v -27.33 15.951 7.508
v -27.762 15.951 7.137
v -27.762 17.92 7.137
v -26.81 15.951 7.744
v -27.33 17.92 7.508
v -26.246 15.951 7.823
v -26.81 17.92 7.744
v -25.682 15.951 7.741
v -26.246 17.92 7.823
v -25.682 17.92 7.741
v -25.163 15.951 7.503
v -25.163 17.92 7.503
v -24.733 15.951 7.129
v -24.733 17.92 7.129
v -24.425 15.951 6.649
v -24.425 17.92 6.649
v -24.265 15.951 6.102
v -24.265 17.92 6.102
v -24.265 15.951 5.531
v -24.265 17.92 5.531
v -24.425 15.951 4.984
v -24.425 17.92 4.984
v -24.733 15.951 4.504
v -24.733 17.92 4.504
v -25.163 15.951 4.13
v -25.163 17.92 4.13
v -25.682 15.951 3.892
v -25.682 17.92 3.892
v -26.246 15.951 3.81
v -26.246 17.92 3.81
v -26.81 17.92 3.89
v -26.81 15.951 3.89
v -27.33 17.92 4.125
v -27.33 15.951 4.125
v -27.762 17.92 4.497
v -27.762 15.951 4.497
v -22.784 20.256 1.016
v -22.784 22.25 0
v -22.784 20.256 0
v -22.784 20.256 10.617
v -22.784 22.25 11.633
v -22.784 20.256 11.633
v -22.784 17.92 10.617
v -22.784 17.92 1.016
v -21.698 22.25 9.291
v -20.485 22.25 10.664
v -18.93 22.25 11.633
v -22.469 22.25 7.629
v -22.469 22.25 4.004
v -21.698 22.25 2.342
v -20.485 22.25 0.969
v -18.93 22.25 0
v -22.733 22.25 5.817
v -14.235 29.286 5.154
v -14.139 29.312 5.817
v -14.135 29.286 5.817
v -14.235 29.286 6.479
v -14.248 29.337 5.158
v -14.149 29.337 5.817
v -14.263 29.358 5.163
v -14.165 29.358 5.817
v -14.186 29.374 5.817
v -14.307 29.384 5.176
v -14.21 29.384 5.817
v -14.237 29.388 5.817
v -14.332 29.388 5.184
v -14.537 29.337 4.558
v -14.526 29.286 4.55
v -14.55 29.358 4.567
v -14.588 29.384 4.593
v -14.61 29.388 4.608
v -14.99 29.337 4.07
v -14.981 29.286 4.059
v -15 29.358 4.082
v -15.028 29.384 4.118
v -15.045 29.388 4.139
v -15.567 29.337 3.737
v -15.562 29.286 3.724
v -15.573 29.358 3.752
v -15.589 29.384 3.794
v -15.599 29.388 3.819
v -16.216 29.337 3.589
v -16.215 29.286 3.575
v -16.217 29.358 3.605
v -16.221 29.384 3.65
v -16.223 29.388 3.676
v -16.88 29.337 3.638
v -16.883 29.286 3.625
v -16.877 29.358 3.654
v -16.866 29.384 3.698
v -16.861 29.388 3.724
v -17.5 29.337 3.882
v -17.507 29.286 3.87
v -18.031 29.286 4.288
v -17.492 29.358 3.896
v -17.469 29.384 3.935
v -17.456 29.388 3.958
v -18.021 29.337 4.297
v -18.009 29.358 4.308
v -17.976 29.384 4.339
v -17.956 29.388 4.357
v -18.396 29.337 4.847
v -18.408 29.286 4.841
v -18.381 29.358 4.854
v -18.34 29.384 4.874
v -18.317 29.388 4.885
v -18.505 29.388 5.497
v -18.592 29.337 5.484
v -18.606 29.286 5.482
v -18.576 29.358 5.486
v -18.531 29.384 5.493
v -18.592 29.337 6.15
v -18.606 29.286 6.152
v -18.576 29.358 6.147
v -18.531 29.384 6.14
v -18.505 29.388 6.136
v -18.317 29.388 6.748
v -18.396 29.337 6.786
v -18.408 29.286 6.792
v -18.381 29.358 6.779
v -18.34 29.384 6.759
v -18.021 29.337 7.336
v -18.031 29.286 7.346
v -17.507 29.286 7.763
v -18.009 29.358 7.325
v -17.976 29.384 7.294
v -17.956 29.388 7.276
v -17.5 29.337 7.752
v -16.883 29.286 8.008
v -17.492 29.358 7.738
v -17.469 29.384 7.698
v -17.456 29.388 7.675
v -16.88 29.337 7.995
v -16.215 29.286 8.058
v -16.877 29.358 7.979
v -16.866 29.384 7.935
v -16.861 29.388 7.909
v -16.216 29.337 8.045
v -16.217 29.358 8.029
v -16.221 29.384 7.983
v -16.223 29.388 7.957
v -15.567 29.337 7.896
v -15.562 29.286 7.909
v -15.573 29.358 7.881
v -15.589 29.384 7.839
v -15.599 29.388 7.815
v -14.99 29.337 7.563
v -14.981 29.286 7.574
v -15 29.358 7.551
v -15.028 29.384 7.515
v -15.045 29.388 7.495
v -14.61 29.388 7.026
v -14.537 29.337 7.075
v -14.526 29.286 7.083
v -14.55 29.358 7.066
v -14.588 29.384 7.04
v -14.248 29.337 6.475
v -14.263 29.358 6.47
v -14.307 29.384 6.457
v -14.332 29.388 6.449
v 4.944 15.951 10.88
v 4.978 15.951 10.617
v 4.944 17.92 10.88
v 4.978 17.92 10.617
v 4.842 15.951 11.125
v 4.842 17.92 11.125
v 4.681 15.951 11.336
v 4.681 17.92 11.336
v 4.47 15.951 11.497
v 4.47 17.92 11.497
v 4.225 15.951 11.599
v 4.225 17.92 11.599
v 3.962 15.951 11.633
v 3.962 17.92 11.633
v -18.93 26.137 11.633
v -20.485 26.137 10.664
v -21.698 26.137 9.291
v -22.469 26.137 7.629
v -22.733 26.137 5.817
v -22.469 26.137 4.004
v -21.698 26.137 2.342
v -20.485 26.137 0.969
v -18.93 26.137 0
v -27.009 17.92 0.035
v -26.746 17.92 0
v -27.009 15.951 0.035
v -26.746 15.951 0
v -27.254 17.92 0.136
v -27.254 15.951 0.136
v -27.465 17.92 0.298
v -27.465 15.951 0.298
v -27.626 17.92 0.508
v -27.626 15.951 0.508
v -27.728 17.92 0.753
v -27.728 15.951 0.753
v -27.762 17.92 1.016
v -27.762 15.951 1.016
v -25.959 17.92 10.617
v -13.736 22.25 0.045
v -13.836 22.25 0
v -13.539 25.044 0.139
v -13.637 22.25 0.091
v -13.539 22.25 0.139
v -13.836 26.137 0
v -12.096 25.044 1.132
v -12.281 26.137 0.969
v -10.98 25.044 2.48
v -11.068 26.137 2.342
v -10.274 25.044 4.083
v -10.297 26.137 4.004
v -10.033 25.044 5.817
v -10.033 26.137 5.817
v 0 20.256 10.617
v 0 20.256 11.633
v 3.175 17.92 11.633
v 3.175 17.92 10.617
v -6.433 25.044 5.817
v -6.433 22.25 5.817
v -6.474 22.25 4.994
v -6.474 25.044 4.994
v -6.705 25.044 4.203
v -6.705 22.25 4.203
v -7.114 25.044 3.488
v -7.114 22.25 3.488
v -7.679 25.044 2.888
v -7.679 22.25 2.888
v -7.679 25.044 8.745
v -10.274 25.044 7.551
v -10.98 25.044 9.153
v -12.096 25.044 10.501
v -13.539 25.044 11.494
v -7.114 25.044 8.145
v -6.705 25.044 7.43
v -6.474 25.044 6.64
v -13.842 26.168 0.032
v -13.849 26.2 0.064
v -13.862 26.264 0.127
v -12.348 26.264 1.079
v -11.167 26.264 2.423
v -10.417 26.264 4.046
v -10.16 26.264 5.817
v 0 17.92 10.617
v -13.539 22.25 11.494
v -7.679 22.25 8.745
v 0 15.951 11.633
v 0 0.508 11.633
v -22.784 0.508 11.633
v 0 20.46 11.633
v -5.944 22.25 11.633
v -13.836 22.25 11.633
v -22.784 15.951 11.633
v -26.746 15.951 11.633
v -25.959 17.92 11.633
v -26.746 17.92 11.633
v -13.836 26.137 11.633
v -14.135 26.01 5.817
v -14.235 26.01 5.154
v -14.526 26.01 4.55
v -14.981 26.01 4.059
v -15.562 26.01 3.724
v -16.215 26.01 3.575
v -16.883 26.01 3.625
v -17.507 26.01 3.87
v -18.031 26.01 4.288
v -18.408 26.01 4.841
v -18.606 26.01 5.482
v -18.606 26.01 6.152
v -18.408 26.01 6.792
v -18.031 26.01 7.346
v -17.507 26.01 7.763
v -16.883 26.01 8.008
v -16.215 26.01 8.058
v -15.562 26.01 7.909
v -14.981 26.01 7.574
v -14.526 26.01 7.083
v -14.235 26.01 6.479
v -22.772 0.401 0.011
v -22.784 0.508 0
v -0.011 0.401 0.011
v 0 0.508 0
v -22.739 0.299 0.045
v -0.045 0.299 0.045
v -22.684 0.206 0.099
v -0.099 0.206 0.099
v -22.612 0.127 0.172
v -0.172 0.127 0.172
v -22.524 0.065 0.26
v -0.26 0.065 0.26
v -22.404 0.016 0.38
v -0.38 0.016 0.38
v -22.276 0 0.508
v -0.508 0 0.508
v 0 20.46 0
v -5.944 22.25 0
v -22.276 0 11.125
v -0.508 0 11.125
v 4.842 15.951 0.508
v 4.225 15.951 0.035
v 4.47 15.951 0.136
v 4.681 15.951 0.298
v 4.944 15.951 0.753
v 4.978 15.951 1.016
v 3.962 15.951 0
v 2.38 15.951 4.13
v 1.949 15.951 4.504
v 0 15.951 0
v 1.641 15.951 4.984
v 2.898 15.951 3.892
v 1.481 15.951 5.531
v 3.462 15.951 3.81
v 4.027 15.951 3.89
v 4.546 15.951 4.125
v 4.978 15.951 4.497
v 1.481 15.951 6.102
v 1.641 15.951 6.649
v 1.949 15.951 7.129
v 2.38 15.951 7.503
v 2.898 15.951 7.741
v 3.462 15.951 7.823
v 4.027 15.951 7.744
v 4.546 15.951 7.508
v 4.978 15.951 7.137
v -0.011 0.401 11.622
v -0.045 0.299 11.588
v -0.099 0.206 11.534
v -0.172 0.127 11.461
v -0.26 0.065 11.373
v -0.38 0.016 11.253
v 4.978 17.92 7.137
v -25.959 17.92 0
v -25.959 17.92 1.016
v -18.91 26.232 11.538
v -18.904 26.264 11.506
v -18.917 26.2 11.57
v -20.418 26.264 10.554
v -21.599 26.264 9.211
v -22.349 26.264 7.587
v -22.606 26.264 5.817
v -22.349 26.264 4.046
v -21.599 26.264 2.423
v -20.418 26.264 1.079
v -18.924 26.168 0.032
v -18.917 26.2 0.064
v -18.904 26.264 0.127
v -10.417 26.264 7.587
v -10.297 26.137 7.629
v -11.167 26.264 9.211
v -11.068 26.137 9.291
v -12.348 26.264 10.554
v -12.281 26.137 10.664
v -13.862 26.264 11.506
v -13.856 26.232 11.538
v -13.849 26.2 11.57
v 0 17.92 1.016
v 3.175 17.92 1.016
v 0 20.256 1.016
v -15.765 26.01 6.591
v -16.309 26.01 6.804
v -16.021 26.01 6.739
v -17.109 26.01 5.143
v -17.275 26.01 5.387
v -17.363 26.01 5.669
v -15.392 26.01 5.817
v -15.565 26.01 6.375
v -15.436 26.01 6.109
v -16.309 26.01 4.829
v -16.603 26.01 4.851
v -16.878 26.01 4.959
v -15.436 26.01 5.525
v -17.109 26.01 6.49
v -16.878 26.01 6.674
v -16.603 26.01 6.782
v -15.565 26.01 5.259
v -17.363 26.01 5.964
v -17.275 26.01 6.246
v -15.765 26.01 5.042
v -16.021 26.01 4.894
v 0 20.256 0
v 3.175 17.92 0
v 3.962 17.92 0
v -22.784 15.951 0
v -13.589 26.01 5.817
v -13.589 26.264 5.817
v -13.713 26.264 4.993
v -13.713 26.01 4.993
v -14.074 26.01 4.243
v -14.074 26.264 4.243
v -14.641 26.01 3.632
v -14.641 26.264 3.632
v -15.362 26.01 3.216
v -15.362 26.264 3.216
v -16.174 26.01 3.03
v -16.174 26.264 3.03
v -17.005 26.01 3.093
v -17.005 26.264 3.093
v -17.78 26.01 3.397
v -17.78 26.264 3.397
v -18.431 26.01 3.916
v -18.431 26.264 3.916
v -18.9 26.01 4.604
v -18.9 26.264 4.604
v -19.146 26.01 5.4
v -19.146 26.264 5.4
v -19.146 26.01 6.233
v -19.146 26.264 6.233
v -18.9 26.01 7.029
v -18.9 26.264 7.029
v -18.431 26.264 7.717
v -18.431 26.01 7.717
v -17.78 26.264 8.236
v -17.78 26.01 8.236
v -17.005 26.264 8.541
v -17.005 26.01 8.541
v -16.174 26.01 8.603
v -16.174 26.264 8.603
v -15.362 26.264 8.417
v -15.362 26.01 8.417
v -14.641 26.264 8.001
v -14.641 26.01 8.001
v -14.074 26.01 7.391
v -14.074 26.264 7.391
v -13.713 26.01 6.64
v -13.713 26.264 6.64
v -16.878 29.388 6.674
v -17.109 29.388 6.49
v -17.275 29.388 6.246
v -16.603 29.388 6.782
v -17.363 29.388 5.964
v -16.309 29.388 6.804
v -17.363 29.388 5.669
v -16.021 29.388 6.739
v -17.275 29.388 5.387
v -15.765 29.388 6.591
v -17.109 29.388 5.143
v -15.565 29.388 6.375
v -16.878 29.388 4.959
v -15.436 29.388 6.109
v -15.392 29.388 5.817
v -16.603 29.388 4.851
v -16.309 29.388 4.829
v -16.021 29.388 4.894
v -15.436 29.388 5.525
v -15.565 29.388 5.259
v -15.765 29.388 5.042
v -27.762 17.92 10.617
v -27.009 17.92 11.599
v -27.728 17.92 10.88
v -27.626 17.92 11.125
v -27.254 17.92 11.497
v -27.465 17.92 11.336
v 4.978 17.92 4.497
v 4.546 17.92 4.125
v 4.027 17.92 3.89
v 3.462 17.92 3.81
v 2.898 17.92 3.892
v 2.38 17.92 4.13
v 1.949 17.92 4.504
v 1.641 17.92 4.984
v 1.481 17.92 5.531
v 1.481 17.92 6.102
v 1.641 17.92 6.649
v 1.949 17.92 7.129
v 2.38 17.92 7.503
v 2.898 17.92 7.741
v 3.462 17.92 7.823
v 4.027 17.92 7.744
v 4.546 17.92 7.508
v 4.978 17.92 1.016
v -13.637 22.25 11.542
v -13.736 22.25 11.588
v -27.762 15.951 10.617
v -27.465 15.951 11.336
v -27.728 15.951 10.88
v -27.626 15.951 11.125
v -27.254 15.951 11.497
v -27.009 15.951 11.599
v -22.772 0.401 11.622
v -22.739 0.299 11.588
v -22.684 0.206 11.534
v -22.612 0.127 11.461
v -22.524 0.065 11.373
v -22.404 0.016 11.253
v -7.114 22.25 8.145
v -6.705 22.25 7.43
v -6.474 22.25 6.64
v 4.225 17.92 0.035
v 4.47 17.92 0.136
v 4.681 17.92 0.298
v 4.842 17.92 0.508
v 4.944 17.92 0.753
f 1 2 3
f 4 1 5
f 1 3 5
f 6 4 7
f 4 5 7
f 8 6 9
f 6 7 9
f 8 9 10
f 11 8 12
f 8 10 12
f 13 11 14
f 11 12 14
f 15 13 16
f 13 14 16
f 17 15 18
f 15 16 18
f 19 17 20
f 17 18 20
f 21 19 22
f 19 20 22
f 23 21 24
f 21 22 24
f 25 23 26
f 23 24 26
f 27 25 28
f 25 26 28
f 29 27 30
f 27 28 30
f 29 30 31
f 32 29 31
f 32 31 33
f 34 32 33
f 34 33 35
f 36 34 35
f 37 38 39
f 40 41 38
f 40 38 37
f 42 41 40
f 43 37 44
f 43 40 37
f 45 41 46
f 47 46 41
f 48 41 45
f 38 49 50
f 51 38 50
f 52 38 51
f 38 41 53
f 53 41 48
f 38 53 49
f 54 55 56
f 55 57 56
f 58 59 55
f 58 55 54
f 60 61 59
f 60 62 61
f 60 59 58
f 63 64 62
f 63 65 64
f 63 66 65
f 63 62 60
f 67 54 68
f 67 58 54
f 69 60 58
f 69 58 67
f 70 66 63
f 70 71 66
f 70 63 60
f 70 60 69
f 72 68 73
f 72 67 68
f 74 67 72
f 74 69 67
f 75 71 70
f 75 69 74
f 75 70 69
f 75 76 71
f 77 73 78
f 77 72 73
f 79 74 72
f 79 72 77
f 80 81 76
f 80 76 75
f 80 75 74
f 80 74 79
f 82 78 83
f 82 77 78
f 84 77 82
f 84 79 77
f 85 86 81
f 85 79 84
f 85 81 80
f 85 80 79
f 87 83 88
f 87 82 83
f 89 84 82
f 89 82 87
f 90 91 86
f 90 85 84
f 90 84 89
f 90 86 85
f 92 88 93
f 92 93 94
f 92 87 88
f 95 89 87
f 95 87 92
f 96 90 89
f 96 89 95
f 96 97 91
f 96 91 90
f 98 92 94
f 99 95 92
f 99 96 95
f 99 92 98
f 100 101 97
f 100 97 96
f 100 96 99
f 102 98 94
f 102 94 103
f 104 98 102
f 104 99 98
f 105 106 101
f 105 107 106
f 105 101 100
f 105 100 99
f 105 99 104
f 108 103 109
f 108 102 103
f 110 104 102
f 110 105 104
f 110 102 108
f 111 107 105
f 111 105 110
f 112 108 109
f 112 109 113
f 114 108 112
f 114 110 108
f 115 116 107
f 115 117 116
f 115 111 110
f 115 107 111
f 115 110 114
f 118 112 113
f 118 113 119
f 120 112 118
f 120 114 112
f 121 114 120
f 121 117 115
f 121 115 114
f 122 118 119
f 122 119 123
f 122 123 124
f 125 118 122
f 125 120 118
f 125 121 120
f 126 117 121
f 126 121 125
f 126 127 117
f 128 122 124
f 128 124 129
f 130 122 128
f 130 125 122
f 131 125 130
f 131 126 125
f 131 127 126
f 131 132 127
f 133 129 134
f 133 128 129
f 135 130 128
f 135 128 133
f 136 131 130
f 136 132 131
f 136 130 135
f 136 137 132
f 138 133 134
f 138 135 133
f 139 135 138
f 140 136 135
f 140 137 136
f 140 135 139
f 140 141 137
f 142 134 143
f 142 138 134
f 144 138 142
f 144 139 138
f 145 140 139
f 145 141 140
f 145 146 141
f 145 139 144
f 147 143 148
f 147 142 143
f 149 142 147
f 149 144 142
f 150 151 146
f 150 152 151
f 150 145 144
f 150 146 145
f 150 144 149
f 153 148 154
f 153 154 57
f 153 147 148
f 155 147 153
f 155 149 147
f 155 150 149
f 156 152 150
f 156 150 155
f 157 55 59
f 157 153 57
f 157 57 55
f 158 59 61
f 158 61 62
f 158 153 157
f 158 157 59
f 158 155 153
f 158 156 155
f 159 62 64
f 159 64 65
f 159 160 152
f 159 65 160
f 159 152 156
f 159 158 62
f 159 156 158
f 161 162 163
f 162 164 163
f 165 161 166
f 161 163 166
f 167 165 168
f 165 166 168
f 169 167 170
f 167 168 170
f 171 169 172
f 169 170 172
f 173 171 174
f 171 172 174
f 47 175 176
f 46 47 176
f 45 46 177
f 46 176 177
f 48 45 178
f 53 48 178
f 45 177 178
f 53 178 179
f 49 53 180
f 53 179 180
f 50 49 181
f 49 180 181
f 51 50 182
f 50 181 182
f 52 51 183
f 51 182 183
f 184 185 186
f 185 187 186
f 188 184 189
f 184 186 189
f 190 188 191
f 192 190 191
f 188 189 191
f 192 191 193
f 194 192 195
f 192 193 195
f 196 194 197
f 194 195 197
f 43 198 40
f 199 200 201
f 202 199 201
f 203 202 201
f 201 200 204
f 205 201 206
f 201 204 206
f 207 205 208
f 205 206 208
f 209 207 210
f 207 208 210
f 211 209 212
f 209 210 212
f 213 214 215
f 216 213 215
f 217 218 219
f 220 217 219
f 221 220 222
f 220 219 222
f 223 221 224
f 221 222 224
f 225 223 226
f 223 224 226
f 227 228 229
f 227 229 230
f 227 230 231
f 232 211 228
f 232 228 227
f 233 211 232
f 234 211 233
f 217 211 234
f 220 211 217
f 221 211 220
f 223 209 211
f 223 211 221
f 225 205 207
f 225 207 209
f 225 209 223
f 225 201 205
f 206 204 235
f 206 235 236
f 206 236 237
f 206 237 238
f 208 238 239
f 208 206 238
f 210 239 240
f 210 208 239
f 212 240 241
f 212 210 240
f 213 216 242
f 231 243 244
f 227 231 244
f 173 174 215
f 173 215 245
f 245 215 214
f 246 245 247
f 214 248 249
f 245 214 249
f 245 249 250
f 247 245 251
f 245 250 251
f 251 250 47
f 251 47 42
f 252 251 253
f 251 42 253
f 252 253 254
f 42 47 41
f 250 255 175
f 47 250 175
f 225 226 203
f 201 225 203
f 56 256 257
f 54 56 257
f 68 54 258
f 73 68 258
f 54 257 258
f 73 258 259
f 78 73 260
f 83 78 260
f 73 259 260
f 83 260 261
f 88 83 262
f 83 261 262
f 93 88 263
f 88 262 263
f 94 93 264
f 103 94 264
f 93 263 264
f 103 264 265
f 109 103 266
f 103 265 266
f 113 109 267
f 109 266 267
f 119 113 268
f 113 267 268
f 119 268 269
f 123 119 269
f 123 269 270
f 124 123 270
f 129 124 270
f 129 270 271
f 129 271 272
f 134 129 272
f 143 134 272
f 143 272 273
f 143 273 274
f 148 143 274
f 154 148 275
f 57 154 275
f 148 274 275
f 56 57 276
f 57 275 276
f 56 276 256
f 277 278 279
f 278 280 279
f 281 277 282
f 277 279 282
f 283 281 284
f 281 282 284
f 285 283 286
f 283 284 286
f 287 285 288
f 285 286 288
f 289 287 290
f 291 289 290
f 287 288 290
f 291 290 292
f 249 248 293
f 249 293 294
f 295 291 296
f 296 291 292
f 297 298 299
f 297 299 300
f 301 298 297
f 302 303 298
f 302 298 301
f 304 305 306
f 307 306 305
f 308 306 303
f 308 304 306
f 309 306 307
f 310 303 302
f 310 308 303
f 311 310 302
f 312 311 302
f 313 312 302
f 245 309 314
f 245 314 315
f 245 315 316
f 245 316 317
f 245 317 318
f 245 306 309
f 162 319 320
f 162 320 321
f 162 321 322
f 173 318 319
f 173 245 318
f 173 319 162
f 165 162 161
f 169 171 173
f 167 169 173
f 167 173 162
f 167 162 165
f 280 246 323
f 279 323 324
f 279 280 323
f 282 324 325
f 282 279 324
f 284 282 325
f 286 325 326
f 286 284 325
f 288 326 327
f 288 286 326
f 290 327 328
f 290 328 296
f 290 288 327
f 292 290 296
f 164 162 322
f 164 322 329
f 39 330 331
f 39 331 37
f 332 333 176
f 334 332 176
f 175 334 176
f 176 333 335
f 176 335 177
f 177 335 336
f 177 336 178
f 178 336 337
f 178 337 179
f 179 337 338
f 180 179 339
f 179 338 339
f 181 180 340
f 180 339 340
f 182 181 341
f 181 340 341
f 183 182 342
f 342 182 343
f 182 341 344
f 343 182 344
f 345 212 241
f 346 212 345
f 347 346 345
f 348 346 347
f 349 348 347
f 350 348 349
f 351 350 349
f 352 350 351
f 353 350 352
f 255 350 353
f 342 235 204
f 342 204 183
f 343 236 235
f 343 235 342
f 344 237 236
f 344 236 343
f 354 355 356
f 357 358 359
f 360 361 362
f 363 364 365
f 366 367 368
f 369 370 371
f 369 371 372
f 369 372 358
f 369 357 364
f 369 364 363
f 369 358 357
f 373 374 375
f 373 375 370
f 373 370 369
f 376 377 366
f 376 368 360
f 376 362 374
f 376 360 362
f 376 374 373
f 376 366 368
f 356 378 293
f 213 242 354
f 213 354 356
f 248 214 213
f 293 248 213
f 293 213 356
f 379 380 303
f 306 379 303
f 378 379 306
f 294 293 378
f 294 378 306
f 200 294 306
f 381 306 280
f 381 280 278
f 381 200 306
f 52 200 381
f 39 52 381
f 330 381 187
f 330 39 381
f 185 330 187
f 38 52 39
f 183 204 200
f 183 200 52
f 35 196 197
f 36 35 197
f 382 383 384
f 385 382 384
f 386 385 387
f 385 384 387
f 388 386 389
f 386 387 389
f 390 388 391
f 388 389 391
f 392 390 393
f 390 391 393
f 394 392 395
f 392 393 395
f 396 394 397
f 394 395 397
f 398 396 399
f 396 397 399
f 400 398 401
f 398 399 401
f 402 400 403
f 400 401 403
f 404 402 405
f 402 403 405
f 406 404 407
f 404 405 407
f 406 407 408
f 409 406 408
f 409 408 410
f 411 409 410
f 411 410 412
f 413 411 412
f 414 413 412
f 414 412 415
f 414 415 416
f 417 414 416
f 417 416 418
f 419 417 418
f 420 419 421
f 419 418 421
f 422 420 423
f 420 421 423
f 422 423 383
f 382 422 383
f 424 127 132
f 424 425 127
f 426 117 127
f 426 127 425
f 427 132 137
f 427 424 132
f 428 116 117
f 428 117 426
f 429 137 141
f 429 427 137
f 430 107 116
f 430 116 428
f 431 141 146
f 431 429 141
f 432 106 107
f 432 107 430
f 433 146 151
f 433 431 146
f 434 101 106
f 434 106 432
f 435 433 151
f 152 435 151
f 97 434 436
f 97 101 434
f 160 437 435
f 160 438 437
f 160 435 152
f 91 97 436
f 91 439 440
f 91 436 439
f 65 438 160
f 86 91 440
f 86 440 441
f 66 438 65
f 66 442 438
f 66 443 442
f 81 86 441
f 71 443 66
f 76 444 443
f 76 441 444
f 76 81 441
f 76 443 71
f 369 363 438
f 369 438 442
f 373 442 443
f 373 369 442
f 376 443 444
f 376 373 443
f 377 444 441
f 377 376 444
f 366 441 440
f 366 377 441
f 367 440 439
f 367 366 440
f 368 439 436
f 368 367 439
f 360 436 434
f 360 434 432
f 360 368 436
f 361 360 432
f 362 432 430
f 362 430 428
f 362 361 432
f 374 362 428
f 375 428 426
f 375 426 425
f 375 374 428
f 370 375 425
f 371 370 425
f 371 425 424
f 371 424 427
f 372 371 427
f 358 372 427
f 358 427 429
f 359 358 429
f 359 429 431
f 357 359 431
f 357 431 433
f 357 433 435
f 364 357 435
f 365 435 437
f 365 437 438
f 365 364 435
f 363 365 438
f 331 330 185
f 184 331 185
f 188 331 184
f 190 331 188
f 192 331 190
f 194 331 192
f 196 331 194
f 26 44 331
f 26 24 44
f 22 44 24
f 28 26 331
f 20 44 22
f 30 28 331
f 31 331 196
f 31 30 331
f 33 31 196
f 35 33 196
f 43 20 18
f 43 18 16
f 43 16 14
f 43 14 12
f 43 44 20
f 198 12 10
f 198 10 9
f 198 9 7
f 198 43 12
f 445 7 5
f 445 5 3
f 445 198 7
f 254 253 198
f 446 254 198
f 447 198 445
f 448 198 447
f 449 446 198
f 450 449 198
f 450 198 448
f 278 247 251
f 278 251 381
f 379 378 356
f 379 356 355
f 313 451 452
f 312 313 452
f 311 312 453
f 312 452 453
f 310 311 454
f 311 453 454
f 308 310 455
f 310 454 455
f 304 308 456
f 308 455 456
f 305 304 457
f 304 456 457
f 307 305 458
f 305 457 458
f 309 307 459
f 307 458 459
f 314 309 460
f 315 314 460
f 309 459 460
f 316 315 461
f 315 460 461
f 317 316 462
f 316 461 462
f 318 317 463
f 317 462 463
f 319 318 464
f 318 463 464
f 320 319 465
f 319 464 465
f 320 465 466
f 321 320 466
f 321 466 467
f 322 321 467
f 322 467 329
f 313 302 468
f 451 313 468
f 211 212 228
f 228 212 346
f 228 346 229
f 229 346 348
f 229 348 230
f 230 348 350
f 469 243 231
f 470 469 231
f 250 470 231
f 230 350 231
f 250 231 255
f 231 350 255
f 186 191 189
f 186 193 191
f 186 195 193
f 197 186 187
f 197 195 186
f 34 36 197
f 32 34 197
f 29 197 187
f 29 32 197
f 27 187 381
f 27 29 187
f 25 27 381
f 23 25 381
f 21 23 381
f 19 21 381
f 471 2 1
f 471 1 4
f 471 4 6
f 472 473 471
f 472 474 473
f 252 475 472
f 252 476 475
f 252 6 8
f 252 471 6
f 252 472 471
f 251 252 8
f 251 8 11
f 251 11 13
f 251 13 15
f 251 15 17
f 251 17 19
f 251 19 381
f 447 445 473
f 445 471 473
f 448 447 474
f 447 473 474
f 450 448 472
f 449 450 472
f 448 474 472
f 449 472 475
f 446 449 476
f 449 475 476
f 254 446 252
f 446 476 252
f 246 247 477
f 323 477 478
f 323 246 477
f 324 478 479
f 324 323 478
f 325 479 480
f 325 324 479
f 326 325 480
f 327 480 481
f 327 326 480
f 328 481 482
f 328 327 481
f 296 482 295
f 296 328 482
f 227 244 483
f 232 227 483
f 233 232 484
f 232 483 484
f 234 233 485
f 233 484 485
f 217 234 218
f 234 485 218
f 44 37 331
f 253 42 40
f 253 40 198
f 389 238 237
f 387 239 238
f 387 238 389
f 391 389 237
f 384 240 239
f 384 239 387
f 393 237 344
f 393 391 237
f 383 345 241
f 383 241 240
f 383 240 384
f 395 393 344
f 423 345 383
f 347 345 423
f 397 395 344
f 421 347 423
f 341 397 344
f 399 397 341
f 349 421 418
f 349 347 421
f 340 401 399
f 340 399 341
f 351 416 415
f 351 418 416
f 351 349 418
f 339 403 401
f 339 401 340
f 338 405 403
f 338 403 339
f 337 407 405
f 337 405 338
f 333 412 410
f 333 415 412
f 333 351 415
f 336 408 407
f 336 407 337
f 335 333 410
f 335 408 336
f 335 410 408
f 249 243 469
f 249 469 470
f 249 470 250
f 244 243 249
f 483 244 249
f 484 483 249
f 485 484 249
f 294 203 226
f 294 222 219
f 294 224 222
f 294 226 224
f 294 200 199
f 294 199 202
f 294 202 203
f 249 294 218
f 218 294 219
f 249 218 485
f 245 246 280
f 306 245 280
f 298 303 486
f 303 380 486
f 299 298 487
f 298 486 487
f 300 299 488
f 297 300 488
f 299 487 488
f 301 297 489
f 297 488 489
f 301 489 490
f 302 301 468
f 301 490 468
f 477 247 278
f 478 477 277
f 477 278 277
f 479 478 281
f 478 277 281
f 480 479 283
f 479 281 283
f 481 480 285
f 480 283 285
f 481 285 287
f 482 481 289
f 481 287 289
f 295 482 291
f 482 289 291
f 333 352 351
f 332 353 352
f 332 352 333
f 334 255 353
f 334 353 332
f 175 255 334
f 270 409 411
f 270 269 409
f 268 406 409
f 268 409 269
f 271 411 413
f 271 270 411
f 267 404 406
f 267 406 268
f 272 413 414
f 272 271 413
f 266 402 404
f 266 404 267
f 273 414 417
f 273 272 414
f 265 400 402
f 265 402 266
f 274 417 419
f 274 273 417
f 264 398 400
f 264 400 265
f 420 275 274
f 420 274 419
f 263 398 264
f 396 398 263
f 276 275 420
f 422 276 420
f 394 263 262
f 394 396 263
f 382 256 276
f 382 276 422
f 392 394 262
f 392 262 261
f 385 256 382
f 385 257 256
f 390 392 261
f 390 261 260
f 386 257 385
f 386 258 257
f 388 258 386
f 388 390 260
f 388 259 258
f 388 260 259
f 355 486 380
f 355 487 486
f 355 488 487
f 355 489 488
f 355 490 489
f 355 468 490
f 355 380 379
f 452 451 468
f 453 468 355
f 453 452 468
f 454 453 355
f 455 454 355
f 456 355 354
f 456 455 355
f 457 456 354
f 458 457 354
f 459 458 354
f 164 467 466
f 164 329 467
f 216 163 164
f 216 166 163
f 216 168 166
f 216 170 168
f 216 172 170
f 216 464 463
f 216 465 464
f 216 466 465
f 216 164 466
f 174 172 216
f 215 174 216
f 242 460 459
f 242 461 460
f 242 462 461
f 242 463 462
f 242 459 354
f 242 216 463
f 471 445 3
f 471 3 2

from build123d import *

# Parameters (mm, degrees)
SKETCH1_W            = 22.7838
SKETCH1_H            = 11.6332
BOSS_EXTRUDE1_DEPTH  = 15.9512
FILLET1_R            = 0.508
BOSS_EXTRUDE3_DEPTH  = 11.6332
CUT_EXTRUDE1_DEPTH   = 4.0132
CHAMFER1_SIZE        = 0.127
FILLET2_R            = 1.016
SKETCH7_R            = 2.0066
CUT_EXTRUDE2_DEPTH   = 18.9197
BOSS_EXTRUDE4_DEPTH  = 2.794
SKETCH9_R            = 2.794
CUT_EXTRUDE3_DEPTH   = 0.254
BOSS_EXTRUDE5_DEPTH  = 1.016
BOSS_EXTRUDE6_DEPTH  = 1.016
SKETCH12_R           = 2.2479
SKETCH12_R_2         = 0.9906
BOSS_EXTRUDE10_DEPTH = 3.3782
FILLET3_R            = 0.1016


with BuildPart() as part:
    # Sketch1 → Boss-Extrude1 (new body)
    with BuildSketch(Plane(origin=(0, 0, 0), x_dir=(1, 0, 0), z_dir=(0, 1, 0))):
        with Locations((-11.3919, -5.8166)):
            Rectangle(SKETCH1_W, SKETCH1_H)
    extrude(amount=BOSS_EXTRUDE1_DEPTH)

    # Fillet1
    fillet1_edges = [part.edges().sort_by_distance(p)[0] for p in [
        (-11.3919, 0, 11.6332),
        (-22.7838, 0, 5.8166),
        (-11.3919, 0, 0),
        (0, 0, 5.8166),
    ]]
    fillet(fillet1_edges, radius=FILLET1_R)

    # Sketch5 → Boss-Extrude3 (add)
    with BuildSketch(Plane.XY.offset(11.6332)):
        Polygon((0, 15.9512), (4.9784, 15.9512), (4.9784, 17.9197), (0, 17.9197), (0, 20.4597), (-5.9436, 22.2504), (-7.512738225, 22.2504), (-7.512738225, 26.2636), (-22.7838, 26.2636), (-22.7838, 17.9197), (-27.7622, 17.9197), (-27.7622, 15.9512), (-22.7838, 15.9512), align=None)
    extrude(amount=-BOSS_EXTRUDE3_DEPTH)

    # Sketch6 → Cut-Extrude1 (cut)
    with BuildSketch(Plane(origin=(0, 26.2636, 0), x_dir=(1, 0, 0), z_dir=(0, 1, 0))):
        with BuildLine():
            Line((-18.93048198, 0), (-22.7838, 0))
            Line((-22.7838, 0), (-22.7838, -11.6332))
            Line((-22.7838, -11.6332), (-18.93048198, -11.6332))
            ThreePointArc((-18.93048198, -11.6332), (-22.733, -5.8166), (-18.93048198, 0))
        make_face()
        with BuildLine():
            Line((-7.512738225, 0), (-13.83551802, 0))
            ThreePointArc((-13.83551802, 0), (-11.067973632, -2.341978479), (-10.033, -5.8166))
            ThreePointArc((-10.033, -5.8166), (-11.067973632, -9.291221521), (-13.83551802, -11.6332))
            Line((-13.83551802, -11.6332), (-7.512738225, -11.6332))
            Line((-7.512738225, -11.6332), (-7.512738225, 0))
        make_face()
    extrude(amount=-CUT_EXTRUDE1_DEPTH, mode=Mode.SUBTRACT)

    # Chamfer1
    chamfer1_edges = [part.edges().sort_by_distance(p)[0] for p in [
        (-16.383, 26.2636, 11.6332),
        (-22.733, 26.2636, 5.8166),
        (-16.383, 26.2636, 0),
        (-10.033, 26.2636, 5.8166),
    ]]
    chamfer(chamfer1_edges, length=CHAMFER1_SIZE)

    # Fillet2
    fillet2_edges = [part.edges().sort_by_distance(p)[0] for p in [
        (-27.7622, 16.93545, 0),
        (-27.7622, 16.93545, 11.6332),
        (4.9784, 16.93545, 0),
        (4.9784, 16.93545, 11.6332),
    ]]
    fillet(fillet2_edges, radius=FILLET2_R)

    # Sketch7 → Cut-Extrude2 (cut, through all)
    with BuildSketch(Plane(origin=(0, 17.9197, 0), x_dir=(1, 0, 0), z_dir=(0, 1, 0))):
        with Locations((3.4671, -5.8166)):
            Circle(SKETCH7_R)
        with Locations((-26.2509, -5.8166)):
            Circle(SKETCH7_R)
    extrude(amount=-CUT_EXTRUDE2_DEPTH, mode=Mode.SUBTRACT)

    # Sketch8 → Boss-Extrude4 (add)
    with BuildSketch(Plane(origin=(0, 22.2504, 0), x_dir=(1, 0, 0), z_dir=(0, 1, 0))):
        with BuildLine():
            Line((-7.679090009, -2.88804007), (-13.538580336, -0.139296346))
            ThreePointArc((-13.538580336, -0.139296346), (-10.033, -5.8166), (-13.538580336, -11.493903654))
            Line((-13.538580336, -11.493903654), (-7.679090009, -8.74515993))
            ThreePointArc((-7.679090009, -8.74515993), (-6.704959334, -7.430304447), (-6.433420255, -5.8166))
            ThreePointArc((-6.433420255, -5.8166), (-6.704959334, -4.202895553), (-7.679090009, -2.88804007))
        make_face()
    extrude(amount=BOSS_EXTRUDE4_DEPTH)

    # Sketch9 → Cut-Extrude3 (cut)
    with BuildSketch(Plane(origin=(0, 26.2636, 0), x_dir=(1, 0, 0), z_dir=(0, 1, 0))):
        with Locations((-16.383, -5.8166)):
            Circle(SKETCH9_R)
    extrude(amount=-CUT_EXTRUDE3_DEPTH, mode=Mode.SUBTRACT)

    # Sketch10 → Boss-Extrude5 (add)
    with BuildSketch(Plane.XY.offset(11.6332)):
        Polygon((0, 20.2565), (3.175, 17.9197), (0, 17.9197), align=None)
        Polygon((-22.7838, 17.9197), (-22.7838, 20.2565), (-25.9588, 17.9197), align=None)
    extrude(amount=-BOSS_EXTRUDE5_DEPTH)

    # Sketch11 → Boss-Extrude6 (add)
    with BuildSketch(Plane(origin=(0, 0, 0), x_dir=(-1, 0, 0), z_dir=(0, 0, -1))):
        Polygon((22.7838, 20.2565), (22.7838, 17.9197), (25.9588, 17.9197), align=None)
        Polygon((0, 20.2565), (-3.175, 17.9197), (0, 17.9197), align=None)
    extrude(amount=-BOSS_EXTRUDE6_DEPTH)

    # Sketch12 → Boss-Extrude10 (add)
    with BuildSketch(Plane(origin=(0, 26.0096, 0), x_dir=(1, 0, 0), z_dir=(0, 1, 0))):
        with Locations((-16.383, -5.8166)):
            Circle(SKETCH12_R)
        with Locations((-16.383, -5.8166)):
            Circle(SKETCH12_R_2, mode=Mode.SUBTRACT)
    extrude(amount=BOSS_EXTRUDE10_DEPTH)

    # Fillet3
    fillet3_edges = [part.edges().sort_by_distance(p)[0] for p in [
        (-18.6309, 29.3878, 5.8166),
    ]]
    fillet(fillet3_edges, radius=FILLET3_R)


solid = part.part
